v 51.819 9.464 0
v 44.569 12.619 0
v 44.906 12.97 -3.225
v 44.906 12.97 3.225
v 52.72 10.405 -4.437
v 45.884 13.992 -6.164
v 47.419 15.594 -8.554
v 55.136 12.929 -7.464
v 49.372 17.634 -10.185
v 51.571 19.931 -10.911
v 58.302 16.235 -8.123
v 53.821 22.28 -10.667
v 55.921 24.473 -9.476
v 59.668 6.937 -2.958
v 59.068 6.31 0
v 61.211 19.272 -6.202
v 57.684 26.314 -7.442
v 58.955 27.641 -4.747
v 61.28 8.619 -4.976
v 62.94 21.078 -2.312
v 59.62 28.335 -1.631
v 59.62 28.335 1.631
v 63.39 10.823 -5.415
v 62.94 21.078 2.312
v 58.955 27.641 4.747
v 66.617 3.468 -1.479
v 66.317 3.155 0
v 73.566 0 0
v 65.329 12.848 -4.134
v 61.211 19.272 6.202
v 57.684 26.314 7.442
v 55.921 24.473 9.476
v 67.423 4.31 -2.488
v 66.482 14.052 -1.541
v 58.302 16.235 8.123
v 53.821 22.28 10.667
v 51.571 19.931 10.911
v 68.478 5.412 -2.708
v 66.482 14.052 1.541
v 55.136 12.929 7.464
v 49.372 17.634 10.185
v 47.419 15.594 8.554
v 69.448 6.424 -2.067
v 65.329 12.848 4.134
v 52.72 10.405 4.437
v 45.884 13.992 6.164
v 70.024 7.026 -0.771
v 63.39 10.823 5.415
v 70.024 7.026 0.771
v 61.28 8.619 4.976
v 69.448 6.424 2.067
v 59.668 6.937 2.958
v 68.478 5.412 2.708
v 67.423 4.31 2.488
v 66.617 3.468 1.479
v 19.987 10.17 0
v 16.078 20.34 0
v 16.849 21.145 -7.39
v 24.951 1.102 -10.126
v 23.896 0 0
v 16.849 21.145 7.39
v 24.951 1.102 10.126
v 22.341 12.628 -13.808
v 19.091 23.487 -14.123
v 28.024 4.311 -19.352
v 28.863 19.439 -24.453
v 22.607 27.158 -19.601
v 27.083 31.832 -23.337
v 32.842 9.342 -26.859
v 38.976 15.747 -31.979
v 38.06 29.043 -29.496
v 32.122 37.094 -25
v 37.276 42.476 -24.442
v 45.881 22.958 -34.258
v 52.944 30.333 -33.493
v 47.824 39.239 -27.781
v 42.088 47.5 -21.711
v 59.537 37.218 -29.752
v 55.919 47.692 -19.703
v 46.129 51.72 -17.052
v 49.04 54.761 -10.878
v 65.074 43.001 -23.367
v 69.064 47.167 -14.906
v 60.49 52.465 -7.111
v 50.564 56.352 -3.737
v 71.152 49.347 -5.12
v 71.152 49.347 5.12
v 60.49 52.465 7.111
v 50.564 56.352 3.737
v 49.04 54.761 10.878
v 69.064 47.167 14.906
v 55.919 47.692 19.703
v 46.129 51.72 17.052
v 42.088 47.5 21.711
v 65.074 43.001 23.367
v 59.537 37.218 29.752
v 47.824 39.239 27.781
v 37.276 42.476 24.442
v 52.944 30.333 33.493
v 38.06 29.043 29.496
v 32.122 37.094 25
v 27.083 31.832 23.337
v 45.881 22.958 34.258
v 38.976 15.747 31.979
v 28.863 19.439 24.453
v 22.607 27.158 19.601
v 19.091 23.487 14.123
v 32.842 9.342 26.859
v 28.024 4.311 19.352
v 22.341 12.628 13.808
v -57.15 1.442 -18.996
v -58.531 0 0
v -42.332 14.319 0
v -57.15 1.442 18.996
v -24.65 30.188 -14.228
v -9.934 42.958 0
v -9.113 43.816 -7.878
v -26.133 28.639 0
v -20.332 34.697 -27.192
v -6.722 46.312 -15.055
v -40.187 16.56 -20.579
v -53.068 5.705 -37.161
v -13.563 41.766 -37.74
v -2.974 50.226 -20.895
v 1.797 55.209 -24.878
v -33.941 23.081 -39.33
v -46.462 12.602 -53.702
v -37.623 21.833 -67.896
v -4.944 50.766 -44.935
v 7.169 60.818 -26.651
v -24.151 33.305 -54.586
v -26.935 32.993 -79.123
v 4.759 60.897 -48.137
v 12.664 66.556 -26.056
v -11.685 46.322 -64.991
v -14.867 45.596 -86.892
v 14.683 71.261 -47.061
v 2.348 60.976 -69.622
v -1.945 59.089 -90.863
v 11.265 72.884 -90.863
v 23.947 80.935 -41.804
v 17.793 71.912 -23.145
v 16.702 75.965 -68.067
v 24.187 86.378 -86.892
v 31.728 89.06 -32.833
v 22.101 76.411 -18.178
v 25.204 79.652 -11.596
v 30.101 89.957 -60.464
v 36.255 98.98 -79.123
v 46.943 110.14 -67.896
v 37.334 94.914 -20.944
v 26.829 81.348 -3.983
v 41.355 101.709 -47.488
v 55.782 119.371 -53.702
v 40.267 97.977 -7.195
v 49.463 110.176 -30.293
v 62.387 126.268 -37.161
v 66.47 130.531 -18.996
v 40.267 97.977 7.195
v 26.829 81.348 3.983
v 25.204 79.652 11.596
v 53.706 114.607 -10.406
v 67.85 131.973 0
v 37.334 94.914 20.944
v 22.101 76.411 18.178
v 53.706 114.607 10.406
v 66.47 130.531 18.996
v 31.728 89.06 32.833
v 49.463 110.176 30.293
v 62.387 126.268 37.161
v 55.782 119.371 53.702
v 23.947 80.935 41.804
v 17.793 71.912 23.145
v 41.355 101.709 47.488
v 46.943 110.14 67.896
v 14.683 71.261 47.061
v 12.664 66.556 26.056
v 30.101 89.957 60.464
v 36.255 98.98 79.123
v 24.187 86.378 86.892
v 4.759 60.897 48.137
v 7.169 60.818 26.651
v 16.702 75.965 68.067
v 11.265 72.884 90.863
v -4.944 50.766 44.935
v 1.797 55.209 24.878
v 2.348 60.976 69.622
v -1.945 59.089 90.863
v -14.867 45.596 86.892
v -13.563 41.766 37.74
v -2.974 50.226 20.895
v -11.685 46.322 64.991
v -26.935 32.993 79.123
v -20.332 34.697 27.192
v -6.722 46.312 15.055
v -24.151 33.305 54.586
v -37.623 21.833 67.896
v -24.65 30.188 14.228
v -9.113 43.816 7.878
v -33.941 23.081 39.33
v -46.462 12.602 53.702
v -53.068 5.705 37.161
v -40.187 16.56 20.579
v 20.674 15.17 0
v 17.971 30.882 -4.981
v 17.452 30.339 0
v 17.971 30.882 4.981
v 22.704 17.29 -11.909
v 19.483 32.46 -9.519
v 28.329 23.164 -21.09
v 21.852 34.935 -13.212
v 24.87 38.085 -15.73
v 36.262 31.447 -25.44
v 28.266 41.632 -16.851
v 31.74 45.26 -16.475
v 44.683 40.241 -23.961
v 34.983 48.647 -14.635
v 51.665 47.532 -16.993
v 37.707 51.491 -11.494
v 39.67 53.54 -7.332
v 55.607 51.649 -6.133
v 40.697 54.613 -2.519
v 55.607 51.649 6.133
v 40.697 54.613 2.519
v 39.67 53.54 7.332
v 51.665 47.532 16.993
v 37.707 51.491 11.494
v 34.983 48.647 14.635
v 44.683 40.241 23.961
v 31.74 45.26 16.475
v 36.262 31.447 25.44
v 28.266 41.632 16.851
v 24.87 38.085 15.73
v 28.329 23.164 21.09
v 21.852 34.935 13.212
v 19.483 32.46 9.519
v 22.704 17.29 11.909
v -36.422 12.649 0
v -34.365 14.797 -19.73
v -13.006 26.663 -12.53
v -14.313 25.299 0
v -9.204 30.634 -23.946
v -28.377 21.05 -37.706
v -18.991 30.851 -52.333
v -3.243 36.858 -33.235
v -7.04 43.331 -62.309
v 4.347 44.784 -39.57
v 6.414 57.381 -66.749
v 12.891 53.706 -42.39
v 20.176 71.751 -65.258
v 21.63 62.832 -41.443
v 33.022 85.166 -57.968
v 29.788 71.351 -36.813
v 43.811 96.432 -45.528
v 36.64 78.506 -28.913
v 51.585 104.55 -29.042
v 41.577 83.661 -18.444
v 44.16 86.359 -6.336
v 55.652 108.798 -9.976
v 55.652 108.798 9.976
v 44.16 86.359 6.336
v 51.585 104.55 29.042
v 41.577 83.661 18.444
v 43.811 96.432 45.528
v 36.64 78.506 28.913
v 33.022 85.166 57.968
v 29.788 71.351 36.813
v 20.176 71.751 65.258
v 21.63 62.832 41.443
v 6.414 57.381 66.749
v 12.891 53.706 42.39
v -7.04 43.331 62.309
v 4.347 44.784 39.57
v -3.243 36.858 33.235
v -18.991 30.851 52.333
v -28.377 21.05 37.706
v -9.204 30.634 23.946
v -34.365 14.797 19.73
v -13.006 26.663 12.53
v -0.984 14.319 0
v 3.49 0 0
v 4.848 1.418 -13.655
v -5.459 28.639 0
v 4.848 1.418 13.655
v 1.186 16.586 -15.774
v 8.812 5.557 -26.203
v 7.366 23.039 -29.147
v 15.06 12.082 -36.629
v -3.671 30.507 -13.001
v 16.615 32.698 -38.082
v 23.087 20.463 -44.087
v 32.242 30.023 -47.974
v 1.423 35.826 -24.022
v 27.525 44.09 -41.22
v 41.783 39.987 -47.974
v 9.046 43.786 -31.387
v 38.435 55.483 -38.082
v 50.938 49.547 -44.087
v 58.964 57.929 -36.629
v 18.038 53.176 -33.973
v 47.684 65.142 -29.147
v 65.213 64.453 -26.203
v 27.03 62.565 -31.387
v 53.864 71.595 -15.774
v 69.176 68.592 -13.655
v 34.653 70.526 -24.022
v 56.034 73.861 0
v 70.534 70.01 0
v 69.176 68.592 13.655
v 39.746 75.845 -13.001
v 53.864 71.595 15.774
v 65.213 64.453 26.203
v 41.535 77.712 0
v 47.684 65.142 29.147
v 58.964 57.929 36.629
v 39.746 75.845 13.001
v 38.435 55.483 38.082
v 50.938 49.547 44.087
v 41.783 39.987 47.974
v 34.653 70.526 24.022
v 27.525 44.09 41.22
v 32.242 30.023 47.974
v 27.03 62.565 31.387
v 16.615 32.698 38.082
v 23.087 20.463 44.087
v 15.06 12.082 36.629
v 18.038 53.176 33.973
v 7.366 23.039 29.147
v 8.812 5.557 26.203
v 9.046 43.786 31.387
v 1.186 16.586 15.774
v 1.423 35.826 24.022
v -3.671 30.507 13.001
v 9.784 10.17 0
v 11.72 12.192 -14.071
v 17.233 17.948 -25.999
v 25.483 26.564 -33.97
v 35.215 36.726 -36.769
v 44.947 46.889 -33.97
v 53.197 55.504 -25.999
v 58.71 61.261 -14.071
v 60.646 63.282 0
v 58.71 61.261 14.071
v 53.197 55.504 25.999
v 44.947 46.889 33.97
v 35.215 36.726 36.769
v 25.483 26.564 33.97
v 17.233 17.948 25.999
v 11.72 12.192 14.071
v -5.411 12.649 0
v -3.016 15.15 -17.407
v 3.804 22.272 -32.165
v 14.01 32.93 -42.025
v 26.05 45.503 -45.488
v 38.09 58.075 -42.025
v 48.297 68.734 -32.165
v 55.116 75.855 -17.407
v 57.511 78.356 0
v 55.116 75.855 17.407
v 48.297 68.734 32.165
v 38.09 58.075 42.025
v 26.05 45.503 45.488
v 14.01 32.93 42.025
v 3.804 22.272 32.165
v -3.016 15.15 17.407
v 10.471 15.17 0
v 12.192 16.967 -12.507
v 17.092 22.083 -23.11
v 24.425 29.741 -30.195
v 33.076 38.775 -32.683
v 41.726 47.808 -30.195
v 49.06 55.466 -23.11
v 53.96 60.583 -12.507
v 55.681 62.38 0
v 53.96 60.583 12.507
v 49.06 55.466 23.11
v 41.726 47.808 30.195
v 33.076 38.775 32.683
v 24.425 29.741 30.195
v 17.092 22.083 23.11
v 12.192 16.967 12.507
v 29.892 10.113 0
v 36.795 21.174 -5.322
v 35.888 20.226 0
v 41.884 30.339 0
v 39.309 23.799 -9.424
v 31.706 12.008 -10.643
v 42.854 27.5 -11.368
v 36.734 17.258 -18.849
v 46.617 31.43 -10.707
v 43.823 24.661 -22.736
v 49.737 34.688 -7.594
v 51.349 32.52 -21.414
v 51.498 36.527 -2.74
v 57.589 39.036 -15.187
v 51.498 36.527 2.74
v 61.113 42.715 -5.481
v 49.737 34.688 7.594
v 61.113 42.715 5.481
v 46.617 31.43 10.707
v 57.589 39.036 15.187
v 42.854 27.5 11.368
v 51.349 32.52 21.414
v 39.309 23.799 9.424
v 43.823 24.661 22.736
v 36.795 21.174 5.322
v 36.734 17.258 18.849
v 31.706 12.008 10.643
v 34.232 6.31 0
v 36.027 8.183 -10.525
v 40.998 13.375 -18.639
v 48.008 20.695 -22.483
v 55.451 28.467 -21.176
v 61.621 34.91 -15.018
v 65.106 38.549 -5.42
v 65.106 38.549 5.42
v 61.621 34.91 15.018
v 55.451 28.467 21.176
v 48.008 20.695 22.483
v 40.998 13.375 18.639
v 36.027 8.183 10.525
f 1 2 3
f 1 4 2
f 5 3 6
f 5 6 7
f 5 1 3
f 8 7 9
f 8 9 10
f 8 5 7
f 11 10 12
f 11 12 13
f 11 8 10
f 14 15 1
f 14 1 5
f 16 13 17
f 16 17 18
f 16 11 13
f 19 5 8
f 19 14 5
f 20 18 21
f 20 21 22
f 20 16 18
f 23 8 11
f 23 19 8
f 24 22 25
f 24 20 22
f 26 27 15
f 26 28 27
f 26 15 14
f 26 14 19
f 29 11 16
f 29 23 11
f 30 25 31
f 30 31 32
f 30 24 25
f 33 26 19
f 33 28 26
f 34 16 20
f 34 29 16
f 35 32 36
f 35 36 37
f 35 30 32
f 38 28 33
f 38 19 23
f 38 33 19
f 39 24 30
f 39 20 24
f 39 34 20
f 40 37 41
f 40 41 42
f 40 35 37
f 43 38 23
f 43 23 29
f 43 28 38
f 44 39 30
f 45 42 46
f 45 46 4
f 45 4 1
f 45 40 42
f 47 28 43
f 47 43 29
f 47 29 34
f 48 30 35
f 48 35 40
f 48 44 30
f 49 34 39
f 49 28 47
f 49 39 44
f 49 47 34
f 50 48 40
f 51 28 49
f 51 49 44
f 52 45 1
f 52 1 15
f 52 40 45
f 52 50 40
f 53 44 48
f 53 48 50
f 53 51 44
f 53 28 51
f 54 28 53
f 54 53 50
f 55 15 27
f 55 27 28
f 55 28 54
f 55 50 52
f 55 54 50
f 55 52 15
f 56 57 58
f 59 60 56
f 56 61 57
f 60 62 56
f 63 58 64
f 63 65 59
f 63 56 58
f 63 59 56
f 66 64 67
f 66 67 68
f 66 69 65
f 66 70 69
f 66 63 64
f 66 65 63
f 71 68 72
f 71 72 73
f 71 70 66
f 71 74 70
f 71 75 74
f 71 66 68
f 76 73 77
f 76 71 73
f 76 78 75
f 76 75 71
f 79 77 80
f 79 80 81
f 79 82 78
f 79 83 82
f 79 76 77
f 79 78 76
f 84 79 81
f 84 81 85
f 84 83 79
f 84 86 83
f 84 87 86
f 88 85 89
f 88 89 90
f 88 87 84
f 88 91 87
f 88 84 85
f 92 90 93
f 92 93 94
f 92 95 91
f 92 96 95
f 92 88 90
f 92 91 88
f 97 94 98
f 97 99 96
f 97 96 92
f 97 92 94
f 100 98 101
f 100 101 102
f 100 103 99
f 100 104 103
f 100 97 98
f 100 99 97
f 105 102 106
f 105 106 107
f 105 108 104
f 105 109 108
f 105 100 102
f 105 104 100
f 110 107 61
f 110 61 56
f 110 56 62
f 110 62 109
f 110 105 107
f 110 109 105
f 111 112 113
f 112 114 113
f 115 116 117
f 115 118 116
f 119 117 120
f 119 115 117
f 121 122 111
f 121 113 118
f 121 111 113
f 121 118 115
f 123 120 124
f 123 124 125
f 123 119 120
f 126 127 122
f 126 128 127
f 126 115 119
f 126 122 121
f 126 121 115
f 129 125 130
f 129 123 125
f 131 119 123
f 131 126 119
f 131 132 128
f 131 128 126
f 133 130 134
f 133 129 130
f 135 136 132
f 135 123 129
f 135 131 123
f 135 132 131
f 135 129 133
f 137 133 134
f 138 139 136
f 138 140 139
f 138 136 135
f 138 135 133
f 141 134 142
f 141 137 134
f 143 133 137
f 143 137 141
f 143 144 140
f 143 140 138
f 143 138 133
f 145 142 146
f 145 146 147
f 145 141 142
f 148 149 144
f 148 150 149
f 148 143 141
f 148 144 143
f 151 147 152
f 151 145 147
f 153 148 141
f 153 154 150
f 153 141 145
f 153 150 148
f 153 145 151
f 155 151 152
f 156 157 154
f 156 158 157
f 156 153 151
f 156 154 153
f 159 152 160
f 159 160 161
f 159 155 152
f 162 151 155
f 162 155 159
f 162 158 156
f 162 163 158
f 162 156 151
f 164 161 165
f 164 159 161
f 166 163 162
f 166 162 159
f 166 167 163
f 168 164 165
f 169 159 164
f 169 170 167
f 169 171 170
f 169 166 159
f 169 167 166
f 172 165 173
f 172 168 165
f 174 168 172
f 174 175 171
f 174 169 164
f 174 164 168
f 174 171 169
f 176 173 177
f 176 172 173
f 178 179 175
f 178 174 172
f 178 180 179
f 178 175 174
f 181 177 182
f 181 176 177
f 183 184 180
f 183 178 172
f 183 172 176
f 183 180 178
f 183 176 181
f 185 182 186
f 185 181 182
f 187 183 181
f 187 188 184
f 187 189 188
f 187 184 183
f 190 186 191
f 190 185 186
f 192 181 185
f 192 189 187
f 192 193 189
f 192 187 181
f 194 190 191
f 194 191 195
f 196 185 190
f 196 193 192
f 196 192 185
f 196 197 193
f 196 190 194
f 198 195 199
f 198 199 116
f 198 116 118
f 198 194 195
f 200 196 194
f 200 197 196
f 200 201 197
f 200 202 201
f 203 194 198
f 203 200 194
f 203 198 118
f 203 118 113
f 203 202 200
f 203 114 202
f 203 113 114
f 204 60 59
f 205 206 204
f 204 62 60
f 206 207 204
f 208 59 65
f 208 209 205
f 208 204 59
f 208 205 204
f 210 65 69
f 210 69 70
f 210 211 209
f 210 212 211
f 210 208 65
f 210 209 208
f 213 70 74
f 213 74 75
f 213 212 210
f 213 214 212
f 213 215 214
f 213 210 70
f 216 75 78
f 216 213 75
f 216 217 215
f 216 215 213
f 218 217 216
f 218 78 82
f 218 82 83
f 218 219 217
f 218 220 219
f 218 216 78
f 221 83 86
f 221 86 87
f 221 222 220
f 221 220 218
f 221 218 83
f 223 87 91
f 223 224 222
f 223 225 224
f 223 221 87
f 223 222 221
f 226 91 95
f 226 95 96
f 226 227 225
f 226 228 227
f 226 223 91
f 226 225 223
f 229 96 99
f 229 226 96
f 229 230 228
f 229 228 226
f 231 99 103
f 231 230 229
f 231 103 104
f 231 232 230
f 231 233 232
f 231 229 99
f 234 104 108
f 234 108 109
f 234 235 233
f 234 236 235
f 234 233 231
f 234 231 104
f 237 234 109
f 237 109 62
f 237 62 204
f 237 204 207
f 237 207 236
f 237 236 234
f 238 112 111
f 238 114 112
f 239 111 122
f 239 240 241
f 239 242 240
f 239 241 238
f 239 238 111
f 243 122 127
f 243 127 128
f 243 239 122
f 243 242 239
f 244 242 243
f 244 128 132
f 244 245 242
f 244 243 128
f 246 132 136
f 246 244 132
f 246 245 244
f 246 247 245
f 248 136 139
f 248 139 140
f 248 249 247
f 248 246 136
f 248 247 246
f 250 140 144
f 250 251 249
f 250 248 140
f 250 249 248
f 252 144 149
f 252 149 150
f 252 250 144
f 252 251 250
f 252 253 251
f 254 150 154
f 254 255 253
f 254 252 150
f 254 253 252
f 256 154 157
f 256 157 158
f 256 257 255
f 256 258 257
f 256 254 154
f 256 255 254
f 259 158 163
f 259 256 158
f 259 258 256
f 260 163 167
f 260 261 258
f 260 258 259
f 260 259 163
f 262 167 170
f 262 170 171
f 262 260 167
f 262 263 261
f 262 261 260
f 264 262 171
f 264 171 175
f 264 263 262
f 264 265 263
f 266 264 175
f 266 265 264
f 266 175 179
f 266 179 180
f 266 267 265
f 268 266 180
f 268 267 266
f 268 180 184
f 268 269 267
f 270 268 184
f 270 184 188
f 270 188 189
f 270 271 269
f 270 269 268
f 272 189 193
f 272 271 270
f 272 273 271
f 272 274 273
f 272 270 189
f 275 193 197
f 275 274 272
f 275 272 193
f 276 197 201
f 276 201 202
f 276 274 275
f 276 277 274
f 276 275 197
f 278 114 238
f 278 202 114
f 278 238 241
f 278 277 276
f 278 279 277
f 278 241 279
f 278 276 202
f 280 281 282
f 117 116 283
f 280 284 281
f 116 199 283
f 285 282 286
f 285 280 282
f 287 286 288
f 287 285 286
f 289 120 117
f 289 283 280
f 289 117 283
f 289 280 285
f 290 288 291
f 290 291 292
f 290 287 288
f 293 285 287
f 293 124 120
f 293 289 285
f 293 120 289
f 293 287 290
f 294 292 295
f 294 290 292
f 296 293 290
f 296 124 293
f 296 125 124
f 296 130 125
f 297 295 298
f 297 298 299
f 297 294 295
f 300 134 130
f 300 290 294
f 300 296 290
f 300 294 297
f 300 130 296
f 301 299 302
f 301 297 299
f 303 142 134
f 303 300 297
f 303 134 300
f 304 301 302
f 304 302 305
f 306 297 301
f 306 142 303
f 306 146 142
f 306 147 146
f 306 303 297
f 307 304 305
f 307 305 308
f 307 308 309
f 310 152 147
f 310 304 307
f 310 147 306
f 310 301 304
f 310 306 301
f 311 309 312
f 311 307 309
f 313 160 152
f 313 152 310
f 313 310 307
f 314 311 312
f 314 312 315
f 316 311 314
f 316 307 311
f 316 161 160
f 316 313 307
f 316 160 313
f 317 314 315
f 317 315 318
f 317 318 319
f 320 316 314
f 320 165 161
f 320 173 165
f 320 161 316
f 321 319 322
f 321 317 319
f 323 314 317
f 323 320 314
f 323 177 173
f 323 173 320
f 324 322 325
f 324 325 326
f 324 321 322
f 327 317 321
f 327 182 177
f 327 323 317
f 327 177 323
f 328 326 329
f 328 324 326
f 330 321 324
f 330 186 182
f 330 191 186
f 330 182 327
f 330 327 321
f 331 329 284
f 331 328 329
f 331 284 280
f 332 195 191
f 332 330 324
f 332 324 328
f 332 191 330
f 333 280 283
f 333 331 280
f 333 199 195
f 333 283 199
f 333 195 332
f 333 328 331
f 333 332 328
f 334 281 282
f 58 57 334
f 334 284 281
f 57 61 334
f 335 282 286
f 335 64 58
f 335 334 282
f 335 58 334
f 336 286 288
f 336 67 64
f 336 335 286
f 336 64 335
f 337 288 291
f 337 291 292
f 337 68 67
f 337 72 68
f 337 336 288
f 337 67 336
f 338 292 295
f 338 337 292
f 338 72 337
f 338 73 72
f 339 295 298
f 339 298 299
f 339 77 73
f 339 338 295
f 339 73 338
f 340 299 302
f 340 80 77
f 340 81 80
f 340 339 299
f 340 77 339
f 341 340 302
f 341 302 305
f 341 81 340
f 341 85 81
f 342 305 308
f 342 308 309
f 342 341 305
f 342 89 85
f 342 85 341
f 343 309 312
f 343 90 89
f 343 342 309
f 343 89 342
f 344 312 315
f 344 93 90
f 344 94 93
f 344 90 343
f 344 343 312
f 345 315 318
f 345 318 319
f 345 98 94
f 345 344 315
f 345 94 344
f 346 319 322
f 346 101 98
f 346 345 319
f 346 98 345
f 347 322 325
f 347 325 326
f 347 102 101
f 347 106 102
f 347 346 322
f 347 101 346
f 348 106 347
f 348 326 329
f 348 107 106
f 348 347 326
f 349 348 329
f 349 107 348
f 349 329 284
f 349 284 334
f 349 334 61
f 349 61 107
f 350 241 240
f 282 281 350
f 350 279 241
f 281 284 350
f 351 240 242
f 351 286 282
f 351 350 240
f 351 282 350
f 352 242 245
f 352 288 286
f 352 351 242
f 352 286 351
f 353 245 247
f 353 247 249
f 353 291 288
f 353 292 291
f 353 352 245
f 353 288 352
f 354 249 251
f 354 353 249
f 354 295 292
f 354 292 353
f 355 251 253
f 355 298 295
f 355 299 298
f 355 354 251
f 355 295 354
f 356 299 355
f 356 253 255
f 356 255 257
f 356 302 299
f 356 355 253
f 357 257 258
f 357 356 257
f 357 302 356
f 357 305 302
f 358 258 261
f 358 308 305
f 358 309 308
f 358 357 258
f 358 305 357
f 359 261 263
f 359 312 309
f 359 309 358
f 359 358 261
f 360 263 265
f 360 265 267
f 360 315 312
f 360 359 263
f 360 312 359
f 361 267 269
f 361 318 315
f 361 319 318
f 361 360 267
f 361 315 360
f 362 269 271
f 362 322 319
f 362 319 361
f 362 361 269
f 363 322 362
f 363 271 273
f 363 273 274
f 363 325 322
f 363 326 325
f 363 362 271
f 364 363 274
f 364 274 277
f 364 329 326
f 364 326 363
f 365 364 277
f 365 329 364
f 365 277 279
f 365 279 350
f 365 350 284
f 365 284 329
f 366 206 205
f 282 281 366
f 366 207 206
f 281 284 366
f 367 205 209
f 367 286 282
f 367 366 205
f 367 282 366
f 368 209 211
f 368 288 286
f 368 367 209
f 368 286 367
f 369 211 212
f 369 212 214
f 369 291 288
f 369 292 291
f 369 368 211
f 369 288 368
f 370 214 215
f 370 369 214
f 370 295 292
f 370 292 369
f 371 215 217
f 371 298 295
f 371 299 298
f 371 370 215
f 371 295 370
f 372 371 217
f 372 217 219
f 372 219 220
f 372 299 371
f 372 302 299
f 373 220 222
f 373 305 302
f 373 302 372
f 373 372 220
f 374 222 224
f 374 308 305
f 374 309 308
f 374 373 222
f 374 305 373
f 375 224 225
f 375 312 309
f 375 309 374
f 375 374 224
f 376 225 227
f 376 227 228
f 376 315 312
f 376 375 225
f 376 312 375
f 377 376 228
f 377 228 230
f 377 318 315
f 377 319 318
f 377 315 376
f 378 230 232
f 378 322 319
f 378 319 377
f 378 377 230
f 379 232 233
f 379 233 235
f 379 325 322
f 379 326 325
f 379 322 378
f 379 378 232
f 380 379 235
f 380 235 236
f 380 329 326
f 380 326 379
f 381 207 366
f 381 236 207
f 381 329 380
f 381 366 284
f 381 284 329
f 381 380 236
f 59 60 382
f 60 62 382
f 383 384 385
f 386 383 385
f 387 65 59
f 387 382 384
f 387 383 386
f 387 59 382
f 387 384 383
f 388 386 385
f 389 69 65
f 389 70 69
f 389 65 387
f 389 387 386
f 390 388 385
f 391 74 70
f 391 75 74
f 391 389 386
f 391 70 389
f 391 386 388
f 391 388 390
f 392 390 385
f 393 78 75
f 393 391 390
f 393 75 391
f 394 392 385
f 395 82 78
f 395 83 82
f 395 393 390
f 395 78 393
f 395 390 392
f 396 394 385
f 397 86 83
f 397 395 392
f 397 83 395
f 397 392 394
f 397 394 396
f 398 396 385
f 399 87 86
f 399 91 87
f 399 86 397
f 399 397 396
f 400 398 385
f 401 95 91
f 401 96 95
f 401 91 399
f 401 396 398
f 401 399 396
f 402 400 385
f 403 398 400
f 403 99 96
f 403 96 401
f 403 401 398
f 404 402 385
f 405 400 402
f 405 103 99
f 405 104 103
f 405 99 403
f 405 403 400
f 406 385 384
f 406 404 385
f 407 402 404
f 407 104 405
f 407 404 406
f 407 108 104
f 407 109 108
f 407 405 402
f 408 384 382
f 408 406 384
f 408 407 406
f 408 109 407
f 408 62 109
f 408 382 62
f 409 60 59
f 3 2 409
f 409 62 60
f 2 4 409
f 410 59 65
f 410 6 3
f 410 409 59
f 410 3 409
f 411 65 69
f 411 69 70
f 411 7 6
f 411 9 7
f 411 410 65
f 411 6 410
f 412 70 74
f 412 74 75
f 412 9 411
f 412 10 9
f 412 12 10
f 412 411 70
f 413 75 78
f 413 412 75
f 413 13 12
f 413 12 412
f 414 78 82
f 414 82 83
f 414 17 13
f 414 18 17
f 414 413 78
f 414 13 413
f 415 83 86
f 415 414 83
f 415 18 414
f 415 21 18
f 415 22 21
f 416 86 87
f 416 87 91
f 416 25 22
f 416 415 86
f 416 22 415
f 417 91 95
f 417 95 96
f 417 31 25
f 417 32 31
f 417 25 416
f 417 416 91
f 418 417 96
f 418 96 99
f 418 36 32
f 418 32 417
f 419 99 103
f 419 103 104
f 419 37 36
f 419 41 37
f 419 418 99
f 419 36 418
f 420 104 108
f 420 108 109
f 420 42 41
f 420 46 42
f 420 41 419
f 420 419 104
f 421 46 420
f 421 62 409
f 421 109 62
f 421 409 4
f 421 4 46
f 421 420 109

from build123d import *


with BuildPart() as f1:
    # F0 (on Top) → F1 (revolve)
    with BuildSketch(Plane.XY):
        Polygon((41.8844297528, 30.3393620998), (23.8956026733, 0), (44.5693284273, 12.6190269366), (73.5662430525, 0), align=None)
    revolve(axis=Axis((57.7253364027, 15.1696810499, 0), (0.7222429716, -0.691639422, 0)))


with BuildPart() as f1b:
    # F0 (on Top) → F1, piece 2 (revolve)
    with BuildSketch(Plane.XY):
        Polygon((17.4518469721, 30.3393620998), (3.4903702326, 0), (16.0784628242, 20.3403178602), (23.8956026733, 0), align=None)
    revolve(axis=Axis((57.7253364027, 15.1696810499, 0), (0.7222429716, -0.691639422, 0)))


with BuildPart() as f1c:
    # F0 (on Top) → F1, piece 3 (revolve)
    with BuildSketch(Plane.XY):
        Polygon((-9.9341273308, 42.9583899677), (-58.5308074951, 0), (-14.3125597388, 25.2988524735), (3.4903702326, 0), align=None)
    revolve(axis=Axis((57.7253364027, 15.1696810499, 0), (0.7222429716, -0.691639422, 0)))


solid = Compound([f1.part, f1b.part, f1c.part])
